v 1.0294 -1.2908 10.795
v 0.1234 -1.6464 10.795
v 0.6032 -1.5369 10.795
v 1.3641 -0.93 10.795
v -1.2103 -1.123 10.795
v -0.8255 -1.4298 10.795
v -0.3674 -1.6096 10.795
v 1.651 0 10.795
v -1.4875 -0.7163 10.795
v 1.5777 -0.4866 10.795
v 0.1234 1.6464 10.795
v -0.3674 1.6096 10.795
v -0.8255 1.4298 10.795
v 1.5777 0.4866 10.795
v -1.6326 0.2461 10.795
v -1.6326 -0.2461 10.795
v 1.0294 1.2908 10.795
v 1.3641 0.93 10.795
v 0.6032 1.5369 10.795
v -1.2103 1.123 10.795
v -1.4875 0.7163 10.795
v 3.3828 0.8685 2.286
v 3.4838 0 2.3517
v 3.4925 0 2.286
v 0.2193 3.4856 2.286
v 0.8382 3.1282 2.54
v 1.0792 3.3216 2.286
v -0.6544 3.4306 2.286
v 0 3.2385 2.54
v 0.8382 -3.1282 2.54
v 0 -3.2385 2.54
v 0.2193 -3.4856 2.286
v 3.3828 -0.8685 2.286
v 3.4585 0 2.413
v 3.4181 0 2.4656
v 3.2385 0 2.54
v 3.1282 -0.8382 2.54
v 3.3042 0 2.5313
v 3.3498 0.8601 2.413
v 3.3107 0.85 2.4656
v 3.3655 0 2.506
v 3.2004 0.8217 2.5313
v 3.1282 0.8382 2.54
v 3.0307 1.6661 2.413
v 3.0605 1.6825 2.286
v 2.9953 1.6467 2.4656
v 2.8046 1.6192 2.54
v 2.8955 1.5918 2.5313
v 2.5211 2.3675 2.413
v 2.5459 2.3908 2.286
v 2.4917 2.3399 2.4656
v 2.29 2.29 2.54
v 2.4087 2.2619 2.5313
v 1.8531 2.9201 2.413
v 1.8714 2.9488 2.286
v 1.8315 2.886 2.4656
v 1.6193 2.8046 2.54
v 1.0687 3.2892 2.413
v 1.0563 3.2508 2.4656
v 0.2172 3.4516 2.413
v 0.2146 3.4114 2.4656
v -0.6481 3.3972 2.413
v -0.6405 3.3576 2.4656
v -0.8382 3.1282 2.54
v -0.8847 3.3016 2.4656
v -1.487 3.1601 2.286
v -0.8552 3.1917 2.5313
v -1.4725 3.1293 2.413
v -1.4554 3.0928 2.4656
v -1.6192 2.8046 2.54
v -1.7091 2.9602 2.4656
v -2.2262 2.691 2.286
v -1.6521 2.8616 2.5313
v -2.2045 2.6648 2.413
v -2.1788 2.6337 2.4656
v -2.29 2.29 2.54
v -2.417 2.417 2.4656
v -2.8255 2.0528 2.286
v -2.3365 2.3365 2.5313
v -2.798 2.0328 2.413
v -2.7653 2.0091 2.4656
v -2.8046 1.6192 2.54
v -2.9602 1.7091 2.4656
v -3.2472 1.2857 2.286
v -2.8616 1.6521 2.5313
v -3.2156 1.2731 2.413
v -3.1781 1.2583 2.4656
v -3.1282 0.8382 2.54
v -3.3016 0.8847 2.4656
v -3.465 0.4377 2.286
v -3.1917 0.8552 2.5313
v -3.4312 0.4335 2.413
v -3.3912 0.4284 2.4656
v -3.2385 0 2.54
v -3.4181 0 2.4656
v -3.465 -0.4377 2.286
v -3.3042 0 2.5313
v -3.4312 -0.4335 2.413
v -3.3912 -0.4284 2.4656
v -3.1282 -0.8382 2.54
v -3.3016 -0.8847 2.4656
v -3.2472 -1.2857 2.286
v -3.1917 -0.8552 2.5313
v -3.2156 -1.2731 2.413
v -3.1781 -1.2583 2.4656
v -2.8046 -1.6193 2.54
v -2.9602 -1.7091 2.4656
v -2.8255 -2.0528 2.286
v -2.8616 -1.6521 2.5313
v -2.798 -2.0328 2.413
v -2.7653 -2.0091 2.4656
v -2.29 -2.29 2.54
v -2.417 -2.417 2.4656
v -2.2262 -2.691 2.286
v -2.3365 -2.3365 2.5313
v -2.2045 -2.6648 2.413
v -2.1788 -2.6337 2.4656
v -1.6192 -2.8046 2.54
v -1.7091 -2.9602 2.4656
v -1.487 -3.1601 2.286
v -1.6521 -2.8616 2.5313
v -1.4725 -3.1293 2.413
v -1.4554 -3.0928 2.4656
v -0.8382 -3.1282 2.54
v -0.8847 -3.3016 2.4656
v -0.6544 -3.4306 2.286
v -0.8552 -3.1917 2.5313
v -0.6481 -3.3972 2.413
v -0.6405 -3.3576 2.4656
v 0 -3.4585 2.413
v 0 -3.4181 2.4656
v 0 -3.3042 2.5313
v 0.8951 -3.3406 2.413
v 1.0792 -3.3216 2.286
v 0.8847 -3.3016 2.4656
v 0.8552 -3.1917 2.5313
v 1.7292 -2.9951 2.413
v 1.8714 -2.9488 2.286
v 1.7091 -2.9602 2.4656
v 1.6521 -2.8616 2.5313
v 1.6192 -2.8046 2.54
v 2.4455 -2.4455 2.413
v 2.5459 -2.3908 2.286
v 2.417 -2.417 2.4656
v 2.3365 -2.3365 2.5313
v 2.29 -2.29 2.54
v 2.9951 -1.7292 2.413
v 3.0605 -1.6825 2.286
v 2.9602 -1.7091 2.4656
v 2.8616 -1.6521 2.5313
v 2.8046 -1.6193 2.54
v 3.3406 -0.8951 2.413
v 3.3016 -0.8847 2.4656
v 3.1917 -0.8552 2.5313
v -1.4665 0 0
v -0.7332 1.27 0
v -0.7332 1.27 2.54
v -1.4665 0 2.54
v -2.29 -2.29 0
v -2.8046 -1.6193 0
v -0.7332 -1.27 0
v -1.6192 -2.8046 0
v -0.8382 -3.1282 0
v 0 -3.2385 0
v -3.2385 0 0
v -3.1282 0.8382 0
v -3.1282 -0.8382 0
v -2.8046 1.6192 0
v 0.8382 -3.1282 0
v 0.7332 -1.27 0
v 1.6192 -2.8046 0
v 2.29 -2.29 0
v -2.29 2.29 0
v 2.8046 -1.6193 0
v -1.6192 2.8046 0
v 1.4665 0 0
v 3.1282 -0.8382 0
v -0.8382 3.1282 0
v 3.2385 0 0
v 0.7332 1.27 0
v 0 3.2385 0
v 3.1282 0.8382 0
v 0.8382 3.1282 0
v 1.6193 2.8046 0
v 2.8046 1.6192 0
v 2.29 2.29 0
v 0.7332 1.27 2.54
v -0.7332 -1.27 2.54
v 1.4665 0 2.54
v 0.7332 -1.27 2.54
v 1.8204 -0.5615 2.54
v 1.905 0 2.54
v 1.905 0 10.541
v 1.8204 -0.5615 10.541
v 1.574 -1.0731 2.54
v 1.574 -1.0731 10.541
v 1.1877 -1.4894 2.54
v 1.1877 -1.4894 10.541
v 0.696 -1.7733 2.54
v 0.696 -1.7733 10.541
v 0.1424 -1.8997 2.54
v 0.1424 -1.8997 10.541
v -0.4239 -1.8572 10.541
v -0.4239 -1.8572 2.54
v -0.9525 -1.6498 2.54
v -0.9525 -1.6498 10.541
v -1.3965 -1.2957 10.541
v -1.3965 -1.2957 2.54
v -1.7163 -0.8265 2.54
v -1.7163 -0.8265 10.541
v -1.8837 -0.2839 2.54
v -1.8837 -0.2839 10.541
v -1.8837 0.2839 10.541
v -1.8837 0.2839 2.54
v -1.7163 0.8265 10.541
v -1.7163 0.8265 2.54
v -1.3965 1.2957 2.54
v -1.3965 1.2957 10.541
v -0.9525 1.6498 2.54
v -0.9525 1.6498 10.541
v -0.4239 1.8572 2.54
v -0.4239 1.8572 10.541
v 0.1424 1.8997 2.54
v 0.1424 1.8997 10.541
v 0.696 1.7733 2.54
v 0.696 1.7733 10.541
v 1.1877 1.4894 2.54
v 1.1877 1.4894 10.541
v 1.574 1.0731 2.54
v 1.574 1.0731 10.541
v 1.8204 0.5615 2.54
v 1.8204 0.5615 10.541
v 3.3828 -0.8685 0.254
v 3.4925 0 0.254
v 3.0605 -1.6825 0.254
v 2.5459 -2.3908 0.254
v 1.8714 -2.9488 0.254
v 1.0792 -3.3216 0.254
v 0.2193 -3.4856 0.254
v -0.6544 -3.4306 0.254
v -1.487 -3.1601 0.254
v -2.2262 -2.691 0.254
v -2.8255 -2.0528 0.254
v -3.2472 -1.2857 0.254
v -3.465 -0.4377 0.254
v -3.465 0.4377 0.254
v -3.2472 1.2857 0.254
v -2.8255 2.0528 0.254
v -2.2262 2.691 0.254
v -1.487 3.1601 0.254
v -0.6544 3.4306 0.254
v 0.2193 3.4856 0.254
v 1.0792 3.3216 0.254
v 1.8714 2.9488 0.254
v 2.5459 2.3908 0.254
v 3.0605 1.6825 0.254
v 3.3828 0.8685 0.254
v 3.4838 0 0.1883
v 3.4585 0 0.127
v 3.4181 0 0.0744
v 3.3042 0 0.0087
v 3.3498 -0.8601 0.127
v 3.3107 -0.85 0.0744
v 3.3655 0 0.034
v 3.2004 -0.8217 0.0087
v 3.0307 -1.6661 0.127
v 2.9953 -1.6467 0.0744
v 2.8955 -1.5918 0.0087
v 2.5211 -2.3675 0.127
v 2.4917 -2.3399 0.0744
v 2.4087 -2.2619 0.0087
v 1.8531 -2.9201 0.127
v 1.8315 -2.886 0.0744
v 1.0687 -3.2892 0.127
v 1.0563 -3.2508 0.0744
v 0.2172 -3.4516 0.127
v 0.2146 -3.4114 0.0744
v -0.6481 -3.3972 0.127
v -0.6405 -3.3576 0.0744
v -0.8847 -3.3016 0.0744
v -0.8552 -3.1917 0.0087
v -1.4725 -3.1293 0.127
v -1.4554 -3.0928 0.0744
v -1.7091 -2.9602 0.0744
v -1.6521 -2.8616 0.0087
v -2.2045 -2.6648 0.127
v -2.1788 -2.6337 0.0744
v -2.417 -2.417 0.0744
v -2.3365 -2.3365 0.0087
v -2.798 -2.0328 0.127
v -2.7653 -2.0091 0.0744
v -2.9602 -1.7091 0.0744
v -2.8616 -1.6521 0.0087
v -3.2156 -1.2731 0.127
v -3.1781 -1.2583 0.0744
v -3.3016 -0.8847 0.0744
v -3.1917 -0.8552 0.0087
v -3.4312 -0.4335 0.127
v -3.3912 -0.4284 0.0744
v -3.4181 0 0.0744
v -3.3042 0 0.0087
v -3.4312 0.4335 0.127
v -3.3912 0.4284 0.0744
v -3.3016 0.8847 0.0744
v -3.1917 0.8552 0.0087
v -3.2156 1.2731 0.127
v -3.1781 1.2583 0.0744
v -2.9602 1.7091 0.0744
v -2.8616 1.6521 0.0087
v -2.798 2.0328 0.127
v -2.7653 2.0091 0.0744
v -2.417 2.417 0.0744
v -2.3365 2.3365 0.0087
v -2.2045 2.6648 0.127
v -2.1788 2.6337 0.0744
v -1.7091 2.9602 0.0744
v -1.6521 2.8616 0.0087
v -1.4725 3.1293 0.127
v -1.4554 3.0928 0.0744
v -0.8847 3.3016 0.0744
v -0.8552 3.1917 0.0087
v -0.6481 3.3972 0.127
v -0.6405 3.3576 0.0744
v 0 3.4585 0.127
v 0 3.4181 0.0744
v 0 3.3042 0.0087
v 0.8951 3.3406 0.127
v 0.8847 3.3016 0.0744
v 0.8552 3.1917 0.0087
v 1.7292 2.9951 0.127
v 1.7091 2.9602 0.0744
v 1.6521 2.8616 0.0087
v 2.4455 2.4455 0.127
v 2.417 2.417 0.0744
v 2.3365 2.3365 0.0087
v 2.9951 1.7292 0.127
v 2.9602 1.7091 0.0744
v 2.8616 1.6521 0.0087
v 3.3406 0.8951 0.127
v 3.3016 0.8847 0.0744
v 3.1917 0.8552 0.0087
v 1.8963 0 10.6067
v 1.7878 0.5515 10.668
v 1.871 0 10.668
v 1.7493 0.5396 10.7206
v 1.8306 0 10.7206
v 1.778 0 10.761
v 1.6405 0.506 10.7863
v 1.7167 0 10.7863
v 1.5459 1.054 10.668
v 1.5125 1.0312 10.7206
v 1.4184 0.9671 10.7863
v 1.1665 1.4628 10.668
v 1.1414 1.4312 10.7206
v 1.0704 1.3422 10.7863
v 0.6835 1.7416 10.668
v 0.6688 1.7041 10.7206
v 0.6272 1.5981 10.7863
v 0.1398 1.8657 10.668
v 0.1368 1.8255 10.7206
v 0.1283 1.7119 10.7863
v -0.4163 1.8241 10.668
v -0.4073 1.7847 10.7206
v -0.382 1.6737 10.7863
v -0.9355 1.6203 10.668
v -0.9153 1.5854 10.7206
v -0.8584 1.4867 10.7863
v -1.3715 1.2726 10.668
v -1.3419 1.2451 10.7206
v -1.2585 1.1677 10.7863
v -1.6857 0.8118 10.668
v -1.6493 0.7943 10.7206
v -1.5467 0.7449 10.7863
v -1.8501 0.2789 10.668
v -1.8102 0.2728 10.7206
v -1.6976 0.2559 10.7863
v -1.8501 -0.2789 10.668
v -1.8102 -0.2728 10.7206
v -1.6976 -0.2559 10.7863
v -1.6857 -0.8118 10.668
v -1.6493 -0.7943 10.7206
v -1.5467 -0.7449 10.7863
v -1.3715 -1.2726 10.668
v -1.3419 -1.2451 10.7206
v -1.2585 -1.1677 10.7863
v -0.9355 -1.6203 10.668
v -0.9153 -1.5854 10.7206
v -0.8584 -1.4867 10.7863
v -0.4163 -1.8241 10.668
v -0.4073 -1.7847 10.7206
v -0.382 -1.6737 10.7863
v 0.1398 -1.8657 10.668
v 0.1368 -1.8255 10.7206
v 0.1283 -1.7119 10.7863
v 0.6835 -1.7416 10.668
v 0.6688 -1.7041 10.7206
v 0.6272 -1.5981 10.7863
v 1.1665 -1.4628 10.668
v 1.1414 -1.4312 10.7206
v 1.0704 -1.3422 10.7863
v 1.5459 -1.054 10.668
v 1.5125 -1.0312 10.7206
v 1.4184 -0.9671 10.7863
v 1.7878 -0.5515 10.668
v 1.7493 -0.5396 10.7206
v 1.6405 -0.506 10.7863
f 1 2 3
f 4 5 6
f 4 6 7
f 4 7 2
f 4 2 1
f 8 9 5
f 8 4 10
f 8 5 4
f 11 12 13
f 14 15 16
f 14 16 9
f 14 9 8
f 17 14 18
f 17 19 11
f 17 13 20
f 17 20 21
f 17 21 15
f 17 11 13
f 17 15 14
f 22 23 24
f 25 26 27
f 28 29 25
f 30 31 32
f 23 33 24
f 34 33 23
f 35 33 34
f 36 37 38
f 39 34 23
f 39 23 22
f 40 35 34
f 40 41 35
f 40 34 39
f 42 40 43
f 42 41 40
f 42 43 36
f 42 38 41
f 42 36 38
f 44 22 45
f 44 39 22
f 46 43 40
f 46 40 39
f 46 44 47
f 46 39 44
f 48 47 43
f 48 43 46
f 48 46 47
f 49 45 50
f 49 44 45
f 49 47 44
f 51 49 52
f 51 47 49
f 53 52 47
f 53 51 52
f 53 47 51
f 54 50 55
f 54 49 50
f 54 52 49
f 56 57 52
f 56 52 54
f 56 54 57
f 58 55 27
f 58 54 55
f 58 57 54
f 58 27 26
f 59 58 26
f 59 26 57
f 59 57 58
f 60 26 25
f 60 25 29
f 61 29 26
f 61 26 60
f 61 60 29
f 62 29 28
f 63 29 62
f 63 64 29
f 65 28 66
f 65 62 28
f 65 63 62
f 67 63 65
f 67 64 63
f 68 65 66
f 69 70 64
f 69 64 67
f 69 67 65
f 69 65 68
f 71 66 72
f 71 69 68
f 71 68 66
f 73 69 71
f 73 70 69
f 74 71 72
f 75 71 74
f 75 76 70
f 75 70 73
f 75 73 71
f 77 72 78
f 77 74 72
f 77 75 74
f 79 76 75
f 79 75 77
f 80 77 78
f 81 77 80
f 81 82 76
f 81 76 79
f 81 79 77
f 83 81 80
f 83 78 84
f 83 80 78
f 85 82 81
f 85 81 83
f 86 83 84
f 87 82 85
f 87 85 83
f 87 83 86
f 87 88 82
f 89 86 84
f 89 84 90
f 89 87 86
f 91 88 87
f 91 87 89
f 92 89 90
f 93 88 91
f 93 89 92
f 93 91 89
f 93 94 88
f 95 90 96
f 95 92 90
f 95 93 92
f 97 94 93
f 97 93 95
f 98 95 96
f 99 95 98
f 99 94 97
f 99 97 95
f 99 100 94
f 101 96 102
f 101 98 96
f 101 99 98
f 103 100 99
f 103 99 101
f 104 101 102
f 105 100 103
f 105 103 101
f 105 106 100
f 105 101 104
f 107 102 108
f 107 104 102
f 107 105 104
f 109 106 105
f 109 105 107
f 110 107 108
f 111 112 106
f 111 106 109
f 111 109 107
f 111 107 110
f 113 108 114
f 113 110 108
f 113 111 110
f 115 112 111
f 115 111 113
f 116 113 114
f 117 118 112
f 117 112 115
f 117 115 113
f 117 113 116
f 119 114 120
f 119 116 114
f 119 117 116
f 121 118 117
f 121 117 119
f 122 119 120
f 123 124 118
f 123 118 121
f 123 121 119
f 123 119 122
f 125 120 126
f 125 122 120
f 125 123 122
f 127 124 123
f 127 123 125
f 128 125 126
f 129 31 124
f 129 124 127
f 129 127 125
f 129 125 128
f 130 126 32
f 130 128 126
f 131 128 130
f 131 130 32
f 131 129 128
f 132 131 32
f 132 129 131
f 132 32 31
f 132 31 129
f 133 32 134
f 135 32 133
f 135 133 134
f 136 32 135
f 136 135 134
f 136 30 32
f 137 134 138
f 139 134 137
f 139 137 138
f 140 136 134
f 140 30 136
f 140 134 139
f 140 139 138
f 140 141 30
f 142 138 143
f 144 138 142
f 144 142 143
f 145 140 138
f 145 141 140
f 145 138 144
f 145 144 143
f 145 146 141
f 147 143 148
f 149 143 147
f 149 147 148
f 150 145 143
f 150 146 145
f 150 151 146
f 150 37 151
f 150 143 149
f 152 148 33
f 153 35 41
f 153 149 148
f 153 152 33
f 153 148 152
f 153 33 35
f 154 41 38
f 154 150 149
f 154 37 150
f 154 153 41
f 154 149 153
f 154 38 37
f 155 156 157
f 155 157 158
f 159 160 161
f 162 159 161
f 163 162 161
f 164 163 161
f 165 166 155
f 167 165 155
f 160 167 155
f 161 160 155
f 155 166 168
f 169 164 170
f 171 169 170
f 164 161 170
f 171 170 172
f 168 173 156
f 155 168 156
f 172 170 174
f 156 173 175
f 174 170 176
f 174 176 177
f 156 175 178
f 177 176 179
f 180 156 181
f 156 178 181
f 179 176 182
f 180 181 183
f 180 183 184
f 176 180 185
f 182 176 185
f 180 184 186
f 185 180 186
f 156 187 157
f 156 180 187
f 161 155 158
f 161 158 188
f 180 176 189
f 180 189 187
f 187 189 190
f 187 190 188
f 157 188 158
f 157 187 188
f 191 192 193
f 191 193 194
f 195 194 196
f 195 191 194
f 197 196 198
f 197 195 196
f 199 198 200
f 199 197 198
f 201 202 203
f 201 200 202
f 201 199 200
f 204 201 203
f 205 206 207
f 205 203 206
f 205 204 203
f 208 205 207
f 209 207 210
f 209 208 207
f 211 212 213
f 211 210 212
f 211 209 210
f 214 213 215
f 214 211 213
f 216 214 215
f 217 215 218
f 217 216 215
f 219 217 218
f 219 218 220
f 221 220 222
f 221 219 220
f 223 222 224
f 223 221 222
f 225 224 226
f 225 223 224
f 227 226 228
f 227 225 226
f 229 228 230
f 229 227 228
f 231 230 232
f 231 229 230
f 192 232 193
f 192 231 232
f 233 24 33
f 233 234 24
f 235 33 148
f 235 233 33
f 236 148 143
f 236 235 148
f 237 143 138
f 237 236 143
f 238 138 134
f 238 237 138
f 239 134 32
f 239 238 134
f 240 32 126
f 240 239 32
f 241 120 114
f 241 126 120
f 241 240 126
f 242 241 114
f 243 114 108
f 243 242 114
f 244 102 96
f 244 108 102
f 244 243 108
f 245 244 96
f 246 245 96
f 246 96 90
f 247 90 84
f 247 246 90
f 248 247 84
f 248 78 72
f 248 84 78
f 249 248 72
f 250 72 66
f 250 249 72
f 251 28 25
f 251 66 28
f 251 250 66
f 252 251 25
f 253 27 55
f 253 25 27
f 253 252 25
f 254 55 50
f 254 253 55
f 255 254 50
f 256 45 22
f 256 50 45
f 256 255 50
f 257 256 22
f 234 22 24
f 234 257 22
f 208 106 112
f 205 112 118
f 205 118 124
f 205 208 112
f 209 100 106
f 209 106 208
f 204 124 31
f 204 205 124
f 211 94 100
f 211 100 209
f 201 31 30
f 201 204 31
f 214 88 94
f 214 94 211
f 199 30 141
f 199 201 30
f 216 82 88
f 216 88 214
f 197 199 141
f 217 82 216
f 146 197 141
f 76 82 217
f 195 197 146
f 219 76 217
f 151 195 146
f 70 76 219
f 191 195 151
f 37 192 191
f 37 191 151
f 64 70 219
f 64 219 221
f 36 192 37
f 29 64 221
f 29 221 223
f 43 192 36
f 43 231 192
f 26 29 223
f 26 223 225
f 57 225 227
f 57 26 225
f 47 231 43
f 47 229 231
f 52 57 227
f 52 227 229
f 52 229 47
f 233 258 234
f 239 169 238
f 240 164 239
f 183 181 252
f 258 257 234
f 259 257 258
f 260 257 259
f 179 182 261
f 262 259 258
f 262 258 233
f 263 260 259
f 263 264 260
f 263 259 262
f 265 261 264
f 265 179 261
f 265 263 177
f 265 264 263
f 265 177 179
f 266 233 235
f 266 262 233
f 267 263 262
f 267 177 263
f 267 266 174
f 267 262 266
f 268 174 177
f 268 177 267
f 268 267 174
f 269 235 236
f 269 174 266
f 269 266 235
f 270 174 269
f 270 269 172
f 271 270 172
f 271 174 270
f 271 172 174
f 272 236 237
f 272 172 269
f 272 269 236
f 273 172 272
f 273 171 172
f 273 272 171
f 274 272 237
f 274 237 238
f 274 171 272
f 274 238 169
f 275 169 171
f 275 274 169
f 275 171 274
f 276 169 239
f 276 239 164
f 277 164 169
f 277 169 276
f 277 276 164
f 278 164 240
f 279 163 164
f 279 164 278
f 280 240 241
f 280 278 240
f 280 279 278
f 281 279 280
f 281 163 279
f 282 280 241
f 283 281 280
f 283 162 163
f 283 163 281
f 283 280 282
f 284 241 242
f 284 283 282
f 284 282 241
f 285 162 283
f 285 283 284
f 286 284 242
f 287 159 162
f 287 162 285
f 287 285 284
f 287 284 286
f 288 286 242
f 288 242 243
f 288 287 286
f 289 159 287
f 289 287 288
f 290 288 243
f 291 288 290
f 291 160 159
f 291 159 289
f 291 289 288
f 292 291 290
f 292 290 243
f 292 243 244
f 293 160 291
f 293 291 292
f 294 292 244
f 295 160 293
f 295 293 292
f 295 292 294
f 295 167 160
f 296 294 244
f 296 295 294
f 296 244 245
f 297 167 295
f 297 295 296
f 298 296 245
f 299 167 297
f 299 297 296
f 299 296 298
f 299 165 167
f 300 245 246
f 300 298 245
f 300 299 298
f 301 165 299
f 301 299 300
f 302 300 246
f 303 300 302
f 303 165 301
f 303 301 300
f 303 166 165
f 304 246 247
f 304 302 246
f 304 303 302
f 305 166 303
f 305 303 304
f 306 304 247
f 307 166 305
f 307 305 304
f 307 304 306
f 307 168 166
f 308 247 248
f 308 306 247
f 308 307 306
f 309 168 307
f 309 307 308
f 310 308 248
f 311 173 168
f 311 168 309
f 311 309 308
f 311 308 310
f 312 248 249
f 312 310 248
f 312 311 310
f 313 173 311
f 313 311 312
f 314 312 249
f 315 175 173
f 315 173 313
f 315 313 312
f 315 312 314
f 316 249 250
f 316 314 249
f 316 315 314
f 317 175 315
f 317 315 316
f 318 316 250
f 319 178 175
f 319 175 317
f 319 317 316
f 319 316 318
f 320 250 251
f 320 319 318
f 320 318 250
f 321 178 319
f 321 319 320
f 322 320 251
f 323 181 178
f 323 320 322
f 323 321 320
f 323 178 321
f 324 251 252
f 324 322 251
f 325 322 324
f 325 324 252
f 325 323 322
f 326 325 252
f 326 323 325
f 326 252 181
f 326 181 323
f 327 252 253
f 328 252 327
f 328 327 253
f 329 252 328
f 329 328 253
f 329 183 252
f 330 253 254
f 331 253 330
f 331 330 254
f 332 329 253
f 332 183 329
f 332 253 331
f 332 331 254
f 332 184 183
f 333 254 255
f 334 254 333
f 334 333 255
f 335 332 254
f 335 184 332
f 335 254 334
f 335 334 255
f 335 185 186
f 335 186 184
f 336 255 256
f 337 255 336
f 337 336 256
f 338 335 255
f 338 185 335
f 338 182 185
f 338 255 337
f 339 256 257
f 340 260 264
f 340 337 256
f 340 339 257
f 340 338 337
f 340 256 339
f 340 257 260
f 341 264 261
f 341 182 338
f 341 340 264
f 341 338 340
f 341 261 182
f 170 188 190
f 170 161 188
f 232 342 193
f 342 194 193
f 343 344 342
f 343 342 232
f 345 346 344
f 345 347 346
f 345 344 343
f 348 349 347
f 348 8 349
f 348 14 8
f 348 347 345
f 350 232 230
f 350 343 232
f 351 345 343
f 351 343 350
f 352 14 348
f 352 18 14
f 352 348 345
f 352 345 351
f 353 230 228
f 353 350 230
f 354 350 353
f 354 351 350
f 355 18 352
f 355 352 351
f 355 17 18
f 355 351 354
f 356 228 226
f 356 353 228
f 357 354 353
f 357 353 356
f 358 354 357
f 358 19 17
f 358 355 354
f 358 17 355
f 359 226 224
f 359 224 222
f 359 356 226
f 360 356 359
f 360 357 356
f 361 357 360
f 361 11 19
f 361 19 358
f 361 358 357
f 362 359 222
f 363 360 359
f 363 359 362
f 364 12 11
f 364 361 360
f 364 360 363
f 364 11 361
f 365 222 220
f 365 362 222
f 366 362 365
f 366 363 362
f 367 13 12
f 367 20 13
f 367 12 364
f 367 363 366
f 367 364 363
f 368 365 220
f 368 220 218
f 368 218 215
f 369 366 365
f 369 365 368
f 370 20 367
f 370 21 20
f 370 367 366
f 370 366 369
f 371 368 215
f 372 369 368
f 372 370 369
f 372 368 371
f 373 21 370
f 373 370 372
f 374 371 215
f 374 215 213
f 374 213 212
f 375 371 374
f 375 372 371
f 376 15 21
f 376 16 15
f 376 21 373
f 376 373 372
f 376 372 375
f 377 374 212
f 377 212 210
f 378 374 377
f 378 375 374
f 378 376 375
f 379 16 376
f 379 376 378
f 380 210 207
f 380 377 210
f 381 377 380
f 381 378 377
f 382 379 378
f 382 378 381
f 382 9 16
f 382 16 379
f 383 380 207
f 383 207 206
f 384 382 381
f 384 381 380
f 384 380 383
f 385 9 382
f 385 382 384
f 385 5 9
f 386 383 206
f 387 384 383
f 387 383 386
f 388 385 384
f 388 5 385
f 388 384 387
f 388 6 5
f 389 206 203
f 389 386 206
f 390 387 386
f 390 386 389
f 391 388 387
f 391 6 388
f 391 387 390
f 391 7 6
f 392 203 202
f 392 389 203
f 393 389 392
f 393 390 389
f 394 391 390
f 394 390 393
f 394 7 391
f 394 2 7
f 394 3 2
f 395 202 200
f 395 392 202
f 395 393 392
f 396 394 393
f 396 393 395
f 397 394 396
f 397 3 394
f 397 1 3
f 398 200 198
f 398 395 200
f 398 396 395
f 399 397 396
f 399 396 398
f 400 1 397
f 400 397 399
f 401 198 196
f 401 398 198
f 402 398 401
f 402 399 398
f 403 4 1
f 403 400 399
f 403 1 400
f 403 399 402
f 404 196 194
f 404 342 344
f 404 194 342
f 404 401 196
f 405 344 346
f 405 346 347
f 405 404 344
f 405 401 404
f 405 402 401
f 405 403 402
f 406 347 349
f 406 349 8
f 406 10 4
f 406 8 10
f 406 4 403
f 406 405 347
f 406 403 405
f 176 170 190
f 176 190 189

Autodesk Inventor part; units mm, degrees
ref_plane "YZ Plane" through (0, 0, 0) normal (1, 0, 0) x (0, 1, 0)
ref_plane "XZ Plane" through (0, 0, 0) normal (0, 1, 0) x (-1, 0, 0)
ref_plane "XY Plane" through (0, 0, 0) normal (0, 0, 1) x (1, 0, 0)
sketch "Sketch1" plane through (0, 0, 0) normal (0, 0, 1) x (1, 0, 0)
  circle A0 centre (0, 0) radius 3.4925
  dimension "d0" = 6.985
extrude "Extrusion1" add sketch "Sketch1" along normal blind 2.54
sketch "Sketch2" plane through (0, 0, 2.54) normal (0, 0, 1) x (1, 0, 0)
  circle A0 centre (0, 0) radius 3.4925 projected
  circle A1 centre (0, 0) radius 1.905
  dimension "d3" = 3.81
extrude "Extrusion2" add sketch "Sketch2" along normal blind 8.255 contours A1
sketch "Sketch3" plane through (0, 0, 0) normal (0, 0, -1) x (-1, 0, 0)
  circle A0 centre (0, 0) radius 3.4925 projected
  line L0 (1.4665, 0) -> (0.7332, -1.27)
  line L1 (0.7332, -1.27) -> (-0.7332, -1.27)
  line L2 (-0.7332, -1.27) -> (-1.4665, 0)
  line L3 (-1.4665, 0) -> (-0.7332, 1.27)
  line L4 (-0.7332, 1.27) -> (0.7332, 1.27)
  line L5 (0.7332, 1.27) -> (1.4665, 0)
  dimension "d6" = 2.54
extrude "Extrusion3" cut sketch "Sketch3" against normal blind 2.54 contours L0 L1 L2 L3 L4 L5
thread "Thread1" size "8-32 UNC" class "2A" standard "ANSI Unified Screw Threads" full length
fillet "Fillet1" radius 0.254 3 edges at (-3.4925, 0, 0) (-3.4925, 0, 2.54) (-1.905, 0, 10.795)
properties part number "20mm T-Nut Fastener 1764"
